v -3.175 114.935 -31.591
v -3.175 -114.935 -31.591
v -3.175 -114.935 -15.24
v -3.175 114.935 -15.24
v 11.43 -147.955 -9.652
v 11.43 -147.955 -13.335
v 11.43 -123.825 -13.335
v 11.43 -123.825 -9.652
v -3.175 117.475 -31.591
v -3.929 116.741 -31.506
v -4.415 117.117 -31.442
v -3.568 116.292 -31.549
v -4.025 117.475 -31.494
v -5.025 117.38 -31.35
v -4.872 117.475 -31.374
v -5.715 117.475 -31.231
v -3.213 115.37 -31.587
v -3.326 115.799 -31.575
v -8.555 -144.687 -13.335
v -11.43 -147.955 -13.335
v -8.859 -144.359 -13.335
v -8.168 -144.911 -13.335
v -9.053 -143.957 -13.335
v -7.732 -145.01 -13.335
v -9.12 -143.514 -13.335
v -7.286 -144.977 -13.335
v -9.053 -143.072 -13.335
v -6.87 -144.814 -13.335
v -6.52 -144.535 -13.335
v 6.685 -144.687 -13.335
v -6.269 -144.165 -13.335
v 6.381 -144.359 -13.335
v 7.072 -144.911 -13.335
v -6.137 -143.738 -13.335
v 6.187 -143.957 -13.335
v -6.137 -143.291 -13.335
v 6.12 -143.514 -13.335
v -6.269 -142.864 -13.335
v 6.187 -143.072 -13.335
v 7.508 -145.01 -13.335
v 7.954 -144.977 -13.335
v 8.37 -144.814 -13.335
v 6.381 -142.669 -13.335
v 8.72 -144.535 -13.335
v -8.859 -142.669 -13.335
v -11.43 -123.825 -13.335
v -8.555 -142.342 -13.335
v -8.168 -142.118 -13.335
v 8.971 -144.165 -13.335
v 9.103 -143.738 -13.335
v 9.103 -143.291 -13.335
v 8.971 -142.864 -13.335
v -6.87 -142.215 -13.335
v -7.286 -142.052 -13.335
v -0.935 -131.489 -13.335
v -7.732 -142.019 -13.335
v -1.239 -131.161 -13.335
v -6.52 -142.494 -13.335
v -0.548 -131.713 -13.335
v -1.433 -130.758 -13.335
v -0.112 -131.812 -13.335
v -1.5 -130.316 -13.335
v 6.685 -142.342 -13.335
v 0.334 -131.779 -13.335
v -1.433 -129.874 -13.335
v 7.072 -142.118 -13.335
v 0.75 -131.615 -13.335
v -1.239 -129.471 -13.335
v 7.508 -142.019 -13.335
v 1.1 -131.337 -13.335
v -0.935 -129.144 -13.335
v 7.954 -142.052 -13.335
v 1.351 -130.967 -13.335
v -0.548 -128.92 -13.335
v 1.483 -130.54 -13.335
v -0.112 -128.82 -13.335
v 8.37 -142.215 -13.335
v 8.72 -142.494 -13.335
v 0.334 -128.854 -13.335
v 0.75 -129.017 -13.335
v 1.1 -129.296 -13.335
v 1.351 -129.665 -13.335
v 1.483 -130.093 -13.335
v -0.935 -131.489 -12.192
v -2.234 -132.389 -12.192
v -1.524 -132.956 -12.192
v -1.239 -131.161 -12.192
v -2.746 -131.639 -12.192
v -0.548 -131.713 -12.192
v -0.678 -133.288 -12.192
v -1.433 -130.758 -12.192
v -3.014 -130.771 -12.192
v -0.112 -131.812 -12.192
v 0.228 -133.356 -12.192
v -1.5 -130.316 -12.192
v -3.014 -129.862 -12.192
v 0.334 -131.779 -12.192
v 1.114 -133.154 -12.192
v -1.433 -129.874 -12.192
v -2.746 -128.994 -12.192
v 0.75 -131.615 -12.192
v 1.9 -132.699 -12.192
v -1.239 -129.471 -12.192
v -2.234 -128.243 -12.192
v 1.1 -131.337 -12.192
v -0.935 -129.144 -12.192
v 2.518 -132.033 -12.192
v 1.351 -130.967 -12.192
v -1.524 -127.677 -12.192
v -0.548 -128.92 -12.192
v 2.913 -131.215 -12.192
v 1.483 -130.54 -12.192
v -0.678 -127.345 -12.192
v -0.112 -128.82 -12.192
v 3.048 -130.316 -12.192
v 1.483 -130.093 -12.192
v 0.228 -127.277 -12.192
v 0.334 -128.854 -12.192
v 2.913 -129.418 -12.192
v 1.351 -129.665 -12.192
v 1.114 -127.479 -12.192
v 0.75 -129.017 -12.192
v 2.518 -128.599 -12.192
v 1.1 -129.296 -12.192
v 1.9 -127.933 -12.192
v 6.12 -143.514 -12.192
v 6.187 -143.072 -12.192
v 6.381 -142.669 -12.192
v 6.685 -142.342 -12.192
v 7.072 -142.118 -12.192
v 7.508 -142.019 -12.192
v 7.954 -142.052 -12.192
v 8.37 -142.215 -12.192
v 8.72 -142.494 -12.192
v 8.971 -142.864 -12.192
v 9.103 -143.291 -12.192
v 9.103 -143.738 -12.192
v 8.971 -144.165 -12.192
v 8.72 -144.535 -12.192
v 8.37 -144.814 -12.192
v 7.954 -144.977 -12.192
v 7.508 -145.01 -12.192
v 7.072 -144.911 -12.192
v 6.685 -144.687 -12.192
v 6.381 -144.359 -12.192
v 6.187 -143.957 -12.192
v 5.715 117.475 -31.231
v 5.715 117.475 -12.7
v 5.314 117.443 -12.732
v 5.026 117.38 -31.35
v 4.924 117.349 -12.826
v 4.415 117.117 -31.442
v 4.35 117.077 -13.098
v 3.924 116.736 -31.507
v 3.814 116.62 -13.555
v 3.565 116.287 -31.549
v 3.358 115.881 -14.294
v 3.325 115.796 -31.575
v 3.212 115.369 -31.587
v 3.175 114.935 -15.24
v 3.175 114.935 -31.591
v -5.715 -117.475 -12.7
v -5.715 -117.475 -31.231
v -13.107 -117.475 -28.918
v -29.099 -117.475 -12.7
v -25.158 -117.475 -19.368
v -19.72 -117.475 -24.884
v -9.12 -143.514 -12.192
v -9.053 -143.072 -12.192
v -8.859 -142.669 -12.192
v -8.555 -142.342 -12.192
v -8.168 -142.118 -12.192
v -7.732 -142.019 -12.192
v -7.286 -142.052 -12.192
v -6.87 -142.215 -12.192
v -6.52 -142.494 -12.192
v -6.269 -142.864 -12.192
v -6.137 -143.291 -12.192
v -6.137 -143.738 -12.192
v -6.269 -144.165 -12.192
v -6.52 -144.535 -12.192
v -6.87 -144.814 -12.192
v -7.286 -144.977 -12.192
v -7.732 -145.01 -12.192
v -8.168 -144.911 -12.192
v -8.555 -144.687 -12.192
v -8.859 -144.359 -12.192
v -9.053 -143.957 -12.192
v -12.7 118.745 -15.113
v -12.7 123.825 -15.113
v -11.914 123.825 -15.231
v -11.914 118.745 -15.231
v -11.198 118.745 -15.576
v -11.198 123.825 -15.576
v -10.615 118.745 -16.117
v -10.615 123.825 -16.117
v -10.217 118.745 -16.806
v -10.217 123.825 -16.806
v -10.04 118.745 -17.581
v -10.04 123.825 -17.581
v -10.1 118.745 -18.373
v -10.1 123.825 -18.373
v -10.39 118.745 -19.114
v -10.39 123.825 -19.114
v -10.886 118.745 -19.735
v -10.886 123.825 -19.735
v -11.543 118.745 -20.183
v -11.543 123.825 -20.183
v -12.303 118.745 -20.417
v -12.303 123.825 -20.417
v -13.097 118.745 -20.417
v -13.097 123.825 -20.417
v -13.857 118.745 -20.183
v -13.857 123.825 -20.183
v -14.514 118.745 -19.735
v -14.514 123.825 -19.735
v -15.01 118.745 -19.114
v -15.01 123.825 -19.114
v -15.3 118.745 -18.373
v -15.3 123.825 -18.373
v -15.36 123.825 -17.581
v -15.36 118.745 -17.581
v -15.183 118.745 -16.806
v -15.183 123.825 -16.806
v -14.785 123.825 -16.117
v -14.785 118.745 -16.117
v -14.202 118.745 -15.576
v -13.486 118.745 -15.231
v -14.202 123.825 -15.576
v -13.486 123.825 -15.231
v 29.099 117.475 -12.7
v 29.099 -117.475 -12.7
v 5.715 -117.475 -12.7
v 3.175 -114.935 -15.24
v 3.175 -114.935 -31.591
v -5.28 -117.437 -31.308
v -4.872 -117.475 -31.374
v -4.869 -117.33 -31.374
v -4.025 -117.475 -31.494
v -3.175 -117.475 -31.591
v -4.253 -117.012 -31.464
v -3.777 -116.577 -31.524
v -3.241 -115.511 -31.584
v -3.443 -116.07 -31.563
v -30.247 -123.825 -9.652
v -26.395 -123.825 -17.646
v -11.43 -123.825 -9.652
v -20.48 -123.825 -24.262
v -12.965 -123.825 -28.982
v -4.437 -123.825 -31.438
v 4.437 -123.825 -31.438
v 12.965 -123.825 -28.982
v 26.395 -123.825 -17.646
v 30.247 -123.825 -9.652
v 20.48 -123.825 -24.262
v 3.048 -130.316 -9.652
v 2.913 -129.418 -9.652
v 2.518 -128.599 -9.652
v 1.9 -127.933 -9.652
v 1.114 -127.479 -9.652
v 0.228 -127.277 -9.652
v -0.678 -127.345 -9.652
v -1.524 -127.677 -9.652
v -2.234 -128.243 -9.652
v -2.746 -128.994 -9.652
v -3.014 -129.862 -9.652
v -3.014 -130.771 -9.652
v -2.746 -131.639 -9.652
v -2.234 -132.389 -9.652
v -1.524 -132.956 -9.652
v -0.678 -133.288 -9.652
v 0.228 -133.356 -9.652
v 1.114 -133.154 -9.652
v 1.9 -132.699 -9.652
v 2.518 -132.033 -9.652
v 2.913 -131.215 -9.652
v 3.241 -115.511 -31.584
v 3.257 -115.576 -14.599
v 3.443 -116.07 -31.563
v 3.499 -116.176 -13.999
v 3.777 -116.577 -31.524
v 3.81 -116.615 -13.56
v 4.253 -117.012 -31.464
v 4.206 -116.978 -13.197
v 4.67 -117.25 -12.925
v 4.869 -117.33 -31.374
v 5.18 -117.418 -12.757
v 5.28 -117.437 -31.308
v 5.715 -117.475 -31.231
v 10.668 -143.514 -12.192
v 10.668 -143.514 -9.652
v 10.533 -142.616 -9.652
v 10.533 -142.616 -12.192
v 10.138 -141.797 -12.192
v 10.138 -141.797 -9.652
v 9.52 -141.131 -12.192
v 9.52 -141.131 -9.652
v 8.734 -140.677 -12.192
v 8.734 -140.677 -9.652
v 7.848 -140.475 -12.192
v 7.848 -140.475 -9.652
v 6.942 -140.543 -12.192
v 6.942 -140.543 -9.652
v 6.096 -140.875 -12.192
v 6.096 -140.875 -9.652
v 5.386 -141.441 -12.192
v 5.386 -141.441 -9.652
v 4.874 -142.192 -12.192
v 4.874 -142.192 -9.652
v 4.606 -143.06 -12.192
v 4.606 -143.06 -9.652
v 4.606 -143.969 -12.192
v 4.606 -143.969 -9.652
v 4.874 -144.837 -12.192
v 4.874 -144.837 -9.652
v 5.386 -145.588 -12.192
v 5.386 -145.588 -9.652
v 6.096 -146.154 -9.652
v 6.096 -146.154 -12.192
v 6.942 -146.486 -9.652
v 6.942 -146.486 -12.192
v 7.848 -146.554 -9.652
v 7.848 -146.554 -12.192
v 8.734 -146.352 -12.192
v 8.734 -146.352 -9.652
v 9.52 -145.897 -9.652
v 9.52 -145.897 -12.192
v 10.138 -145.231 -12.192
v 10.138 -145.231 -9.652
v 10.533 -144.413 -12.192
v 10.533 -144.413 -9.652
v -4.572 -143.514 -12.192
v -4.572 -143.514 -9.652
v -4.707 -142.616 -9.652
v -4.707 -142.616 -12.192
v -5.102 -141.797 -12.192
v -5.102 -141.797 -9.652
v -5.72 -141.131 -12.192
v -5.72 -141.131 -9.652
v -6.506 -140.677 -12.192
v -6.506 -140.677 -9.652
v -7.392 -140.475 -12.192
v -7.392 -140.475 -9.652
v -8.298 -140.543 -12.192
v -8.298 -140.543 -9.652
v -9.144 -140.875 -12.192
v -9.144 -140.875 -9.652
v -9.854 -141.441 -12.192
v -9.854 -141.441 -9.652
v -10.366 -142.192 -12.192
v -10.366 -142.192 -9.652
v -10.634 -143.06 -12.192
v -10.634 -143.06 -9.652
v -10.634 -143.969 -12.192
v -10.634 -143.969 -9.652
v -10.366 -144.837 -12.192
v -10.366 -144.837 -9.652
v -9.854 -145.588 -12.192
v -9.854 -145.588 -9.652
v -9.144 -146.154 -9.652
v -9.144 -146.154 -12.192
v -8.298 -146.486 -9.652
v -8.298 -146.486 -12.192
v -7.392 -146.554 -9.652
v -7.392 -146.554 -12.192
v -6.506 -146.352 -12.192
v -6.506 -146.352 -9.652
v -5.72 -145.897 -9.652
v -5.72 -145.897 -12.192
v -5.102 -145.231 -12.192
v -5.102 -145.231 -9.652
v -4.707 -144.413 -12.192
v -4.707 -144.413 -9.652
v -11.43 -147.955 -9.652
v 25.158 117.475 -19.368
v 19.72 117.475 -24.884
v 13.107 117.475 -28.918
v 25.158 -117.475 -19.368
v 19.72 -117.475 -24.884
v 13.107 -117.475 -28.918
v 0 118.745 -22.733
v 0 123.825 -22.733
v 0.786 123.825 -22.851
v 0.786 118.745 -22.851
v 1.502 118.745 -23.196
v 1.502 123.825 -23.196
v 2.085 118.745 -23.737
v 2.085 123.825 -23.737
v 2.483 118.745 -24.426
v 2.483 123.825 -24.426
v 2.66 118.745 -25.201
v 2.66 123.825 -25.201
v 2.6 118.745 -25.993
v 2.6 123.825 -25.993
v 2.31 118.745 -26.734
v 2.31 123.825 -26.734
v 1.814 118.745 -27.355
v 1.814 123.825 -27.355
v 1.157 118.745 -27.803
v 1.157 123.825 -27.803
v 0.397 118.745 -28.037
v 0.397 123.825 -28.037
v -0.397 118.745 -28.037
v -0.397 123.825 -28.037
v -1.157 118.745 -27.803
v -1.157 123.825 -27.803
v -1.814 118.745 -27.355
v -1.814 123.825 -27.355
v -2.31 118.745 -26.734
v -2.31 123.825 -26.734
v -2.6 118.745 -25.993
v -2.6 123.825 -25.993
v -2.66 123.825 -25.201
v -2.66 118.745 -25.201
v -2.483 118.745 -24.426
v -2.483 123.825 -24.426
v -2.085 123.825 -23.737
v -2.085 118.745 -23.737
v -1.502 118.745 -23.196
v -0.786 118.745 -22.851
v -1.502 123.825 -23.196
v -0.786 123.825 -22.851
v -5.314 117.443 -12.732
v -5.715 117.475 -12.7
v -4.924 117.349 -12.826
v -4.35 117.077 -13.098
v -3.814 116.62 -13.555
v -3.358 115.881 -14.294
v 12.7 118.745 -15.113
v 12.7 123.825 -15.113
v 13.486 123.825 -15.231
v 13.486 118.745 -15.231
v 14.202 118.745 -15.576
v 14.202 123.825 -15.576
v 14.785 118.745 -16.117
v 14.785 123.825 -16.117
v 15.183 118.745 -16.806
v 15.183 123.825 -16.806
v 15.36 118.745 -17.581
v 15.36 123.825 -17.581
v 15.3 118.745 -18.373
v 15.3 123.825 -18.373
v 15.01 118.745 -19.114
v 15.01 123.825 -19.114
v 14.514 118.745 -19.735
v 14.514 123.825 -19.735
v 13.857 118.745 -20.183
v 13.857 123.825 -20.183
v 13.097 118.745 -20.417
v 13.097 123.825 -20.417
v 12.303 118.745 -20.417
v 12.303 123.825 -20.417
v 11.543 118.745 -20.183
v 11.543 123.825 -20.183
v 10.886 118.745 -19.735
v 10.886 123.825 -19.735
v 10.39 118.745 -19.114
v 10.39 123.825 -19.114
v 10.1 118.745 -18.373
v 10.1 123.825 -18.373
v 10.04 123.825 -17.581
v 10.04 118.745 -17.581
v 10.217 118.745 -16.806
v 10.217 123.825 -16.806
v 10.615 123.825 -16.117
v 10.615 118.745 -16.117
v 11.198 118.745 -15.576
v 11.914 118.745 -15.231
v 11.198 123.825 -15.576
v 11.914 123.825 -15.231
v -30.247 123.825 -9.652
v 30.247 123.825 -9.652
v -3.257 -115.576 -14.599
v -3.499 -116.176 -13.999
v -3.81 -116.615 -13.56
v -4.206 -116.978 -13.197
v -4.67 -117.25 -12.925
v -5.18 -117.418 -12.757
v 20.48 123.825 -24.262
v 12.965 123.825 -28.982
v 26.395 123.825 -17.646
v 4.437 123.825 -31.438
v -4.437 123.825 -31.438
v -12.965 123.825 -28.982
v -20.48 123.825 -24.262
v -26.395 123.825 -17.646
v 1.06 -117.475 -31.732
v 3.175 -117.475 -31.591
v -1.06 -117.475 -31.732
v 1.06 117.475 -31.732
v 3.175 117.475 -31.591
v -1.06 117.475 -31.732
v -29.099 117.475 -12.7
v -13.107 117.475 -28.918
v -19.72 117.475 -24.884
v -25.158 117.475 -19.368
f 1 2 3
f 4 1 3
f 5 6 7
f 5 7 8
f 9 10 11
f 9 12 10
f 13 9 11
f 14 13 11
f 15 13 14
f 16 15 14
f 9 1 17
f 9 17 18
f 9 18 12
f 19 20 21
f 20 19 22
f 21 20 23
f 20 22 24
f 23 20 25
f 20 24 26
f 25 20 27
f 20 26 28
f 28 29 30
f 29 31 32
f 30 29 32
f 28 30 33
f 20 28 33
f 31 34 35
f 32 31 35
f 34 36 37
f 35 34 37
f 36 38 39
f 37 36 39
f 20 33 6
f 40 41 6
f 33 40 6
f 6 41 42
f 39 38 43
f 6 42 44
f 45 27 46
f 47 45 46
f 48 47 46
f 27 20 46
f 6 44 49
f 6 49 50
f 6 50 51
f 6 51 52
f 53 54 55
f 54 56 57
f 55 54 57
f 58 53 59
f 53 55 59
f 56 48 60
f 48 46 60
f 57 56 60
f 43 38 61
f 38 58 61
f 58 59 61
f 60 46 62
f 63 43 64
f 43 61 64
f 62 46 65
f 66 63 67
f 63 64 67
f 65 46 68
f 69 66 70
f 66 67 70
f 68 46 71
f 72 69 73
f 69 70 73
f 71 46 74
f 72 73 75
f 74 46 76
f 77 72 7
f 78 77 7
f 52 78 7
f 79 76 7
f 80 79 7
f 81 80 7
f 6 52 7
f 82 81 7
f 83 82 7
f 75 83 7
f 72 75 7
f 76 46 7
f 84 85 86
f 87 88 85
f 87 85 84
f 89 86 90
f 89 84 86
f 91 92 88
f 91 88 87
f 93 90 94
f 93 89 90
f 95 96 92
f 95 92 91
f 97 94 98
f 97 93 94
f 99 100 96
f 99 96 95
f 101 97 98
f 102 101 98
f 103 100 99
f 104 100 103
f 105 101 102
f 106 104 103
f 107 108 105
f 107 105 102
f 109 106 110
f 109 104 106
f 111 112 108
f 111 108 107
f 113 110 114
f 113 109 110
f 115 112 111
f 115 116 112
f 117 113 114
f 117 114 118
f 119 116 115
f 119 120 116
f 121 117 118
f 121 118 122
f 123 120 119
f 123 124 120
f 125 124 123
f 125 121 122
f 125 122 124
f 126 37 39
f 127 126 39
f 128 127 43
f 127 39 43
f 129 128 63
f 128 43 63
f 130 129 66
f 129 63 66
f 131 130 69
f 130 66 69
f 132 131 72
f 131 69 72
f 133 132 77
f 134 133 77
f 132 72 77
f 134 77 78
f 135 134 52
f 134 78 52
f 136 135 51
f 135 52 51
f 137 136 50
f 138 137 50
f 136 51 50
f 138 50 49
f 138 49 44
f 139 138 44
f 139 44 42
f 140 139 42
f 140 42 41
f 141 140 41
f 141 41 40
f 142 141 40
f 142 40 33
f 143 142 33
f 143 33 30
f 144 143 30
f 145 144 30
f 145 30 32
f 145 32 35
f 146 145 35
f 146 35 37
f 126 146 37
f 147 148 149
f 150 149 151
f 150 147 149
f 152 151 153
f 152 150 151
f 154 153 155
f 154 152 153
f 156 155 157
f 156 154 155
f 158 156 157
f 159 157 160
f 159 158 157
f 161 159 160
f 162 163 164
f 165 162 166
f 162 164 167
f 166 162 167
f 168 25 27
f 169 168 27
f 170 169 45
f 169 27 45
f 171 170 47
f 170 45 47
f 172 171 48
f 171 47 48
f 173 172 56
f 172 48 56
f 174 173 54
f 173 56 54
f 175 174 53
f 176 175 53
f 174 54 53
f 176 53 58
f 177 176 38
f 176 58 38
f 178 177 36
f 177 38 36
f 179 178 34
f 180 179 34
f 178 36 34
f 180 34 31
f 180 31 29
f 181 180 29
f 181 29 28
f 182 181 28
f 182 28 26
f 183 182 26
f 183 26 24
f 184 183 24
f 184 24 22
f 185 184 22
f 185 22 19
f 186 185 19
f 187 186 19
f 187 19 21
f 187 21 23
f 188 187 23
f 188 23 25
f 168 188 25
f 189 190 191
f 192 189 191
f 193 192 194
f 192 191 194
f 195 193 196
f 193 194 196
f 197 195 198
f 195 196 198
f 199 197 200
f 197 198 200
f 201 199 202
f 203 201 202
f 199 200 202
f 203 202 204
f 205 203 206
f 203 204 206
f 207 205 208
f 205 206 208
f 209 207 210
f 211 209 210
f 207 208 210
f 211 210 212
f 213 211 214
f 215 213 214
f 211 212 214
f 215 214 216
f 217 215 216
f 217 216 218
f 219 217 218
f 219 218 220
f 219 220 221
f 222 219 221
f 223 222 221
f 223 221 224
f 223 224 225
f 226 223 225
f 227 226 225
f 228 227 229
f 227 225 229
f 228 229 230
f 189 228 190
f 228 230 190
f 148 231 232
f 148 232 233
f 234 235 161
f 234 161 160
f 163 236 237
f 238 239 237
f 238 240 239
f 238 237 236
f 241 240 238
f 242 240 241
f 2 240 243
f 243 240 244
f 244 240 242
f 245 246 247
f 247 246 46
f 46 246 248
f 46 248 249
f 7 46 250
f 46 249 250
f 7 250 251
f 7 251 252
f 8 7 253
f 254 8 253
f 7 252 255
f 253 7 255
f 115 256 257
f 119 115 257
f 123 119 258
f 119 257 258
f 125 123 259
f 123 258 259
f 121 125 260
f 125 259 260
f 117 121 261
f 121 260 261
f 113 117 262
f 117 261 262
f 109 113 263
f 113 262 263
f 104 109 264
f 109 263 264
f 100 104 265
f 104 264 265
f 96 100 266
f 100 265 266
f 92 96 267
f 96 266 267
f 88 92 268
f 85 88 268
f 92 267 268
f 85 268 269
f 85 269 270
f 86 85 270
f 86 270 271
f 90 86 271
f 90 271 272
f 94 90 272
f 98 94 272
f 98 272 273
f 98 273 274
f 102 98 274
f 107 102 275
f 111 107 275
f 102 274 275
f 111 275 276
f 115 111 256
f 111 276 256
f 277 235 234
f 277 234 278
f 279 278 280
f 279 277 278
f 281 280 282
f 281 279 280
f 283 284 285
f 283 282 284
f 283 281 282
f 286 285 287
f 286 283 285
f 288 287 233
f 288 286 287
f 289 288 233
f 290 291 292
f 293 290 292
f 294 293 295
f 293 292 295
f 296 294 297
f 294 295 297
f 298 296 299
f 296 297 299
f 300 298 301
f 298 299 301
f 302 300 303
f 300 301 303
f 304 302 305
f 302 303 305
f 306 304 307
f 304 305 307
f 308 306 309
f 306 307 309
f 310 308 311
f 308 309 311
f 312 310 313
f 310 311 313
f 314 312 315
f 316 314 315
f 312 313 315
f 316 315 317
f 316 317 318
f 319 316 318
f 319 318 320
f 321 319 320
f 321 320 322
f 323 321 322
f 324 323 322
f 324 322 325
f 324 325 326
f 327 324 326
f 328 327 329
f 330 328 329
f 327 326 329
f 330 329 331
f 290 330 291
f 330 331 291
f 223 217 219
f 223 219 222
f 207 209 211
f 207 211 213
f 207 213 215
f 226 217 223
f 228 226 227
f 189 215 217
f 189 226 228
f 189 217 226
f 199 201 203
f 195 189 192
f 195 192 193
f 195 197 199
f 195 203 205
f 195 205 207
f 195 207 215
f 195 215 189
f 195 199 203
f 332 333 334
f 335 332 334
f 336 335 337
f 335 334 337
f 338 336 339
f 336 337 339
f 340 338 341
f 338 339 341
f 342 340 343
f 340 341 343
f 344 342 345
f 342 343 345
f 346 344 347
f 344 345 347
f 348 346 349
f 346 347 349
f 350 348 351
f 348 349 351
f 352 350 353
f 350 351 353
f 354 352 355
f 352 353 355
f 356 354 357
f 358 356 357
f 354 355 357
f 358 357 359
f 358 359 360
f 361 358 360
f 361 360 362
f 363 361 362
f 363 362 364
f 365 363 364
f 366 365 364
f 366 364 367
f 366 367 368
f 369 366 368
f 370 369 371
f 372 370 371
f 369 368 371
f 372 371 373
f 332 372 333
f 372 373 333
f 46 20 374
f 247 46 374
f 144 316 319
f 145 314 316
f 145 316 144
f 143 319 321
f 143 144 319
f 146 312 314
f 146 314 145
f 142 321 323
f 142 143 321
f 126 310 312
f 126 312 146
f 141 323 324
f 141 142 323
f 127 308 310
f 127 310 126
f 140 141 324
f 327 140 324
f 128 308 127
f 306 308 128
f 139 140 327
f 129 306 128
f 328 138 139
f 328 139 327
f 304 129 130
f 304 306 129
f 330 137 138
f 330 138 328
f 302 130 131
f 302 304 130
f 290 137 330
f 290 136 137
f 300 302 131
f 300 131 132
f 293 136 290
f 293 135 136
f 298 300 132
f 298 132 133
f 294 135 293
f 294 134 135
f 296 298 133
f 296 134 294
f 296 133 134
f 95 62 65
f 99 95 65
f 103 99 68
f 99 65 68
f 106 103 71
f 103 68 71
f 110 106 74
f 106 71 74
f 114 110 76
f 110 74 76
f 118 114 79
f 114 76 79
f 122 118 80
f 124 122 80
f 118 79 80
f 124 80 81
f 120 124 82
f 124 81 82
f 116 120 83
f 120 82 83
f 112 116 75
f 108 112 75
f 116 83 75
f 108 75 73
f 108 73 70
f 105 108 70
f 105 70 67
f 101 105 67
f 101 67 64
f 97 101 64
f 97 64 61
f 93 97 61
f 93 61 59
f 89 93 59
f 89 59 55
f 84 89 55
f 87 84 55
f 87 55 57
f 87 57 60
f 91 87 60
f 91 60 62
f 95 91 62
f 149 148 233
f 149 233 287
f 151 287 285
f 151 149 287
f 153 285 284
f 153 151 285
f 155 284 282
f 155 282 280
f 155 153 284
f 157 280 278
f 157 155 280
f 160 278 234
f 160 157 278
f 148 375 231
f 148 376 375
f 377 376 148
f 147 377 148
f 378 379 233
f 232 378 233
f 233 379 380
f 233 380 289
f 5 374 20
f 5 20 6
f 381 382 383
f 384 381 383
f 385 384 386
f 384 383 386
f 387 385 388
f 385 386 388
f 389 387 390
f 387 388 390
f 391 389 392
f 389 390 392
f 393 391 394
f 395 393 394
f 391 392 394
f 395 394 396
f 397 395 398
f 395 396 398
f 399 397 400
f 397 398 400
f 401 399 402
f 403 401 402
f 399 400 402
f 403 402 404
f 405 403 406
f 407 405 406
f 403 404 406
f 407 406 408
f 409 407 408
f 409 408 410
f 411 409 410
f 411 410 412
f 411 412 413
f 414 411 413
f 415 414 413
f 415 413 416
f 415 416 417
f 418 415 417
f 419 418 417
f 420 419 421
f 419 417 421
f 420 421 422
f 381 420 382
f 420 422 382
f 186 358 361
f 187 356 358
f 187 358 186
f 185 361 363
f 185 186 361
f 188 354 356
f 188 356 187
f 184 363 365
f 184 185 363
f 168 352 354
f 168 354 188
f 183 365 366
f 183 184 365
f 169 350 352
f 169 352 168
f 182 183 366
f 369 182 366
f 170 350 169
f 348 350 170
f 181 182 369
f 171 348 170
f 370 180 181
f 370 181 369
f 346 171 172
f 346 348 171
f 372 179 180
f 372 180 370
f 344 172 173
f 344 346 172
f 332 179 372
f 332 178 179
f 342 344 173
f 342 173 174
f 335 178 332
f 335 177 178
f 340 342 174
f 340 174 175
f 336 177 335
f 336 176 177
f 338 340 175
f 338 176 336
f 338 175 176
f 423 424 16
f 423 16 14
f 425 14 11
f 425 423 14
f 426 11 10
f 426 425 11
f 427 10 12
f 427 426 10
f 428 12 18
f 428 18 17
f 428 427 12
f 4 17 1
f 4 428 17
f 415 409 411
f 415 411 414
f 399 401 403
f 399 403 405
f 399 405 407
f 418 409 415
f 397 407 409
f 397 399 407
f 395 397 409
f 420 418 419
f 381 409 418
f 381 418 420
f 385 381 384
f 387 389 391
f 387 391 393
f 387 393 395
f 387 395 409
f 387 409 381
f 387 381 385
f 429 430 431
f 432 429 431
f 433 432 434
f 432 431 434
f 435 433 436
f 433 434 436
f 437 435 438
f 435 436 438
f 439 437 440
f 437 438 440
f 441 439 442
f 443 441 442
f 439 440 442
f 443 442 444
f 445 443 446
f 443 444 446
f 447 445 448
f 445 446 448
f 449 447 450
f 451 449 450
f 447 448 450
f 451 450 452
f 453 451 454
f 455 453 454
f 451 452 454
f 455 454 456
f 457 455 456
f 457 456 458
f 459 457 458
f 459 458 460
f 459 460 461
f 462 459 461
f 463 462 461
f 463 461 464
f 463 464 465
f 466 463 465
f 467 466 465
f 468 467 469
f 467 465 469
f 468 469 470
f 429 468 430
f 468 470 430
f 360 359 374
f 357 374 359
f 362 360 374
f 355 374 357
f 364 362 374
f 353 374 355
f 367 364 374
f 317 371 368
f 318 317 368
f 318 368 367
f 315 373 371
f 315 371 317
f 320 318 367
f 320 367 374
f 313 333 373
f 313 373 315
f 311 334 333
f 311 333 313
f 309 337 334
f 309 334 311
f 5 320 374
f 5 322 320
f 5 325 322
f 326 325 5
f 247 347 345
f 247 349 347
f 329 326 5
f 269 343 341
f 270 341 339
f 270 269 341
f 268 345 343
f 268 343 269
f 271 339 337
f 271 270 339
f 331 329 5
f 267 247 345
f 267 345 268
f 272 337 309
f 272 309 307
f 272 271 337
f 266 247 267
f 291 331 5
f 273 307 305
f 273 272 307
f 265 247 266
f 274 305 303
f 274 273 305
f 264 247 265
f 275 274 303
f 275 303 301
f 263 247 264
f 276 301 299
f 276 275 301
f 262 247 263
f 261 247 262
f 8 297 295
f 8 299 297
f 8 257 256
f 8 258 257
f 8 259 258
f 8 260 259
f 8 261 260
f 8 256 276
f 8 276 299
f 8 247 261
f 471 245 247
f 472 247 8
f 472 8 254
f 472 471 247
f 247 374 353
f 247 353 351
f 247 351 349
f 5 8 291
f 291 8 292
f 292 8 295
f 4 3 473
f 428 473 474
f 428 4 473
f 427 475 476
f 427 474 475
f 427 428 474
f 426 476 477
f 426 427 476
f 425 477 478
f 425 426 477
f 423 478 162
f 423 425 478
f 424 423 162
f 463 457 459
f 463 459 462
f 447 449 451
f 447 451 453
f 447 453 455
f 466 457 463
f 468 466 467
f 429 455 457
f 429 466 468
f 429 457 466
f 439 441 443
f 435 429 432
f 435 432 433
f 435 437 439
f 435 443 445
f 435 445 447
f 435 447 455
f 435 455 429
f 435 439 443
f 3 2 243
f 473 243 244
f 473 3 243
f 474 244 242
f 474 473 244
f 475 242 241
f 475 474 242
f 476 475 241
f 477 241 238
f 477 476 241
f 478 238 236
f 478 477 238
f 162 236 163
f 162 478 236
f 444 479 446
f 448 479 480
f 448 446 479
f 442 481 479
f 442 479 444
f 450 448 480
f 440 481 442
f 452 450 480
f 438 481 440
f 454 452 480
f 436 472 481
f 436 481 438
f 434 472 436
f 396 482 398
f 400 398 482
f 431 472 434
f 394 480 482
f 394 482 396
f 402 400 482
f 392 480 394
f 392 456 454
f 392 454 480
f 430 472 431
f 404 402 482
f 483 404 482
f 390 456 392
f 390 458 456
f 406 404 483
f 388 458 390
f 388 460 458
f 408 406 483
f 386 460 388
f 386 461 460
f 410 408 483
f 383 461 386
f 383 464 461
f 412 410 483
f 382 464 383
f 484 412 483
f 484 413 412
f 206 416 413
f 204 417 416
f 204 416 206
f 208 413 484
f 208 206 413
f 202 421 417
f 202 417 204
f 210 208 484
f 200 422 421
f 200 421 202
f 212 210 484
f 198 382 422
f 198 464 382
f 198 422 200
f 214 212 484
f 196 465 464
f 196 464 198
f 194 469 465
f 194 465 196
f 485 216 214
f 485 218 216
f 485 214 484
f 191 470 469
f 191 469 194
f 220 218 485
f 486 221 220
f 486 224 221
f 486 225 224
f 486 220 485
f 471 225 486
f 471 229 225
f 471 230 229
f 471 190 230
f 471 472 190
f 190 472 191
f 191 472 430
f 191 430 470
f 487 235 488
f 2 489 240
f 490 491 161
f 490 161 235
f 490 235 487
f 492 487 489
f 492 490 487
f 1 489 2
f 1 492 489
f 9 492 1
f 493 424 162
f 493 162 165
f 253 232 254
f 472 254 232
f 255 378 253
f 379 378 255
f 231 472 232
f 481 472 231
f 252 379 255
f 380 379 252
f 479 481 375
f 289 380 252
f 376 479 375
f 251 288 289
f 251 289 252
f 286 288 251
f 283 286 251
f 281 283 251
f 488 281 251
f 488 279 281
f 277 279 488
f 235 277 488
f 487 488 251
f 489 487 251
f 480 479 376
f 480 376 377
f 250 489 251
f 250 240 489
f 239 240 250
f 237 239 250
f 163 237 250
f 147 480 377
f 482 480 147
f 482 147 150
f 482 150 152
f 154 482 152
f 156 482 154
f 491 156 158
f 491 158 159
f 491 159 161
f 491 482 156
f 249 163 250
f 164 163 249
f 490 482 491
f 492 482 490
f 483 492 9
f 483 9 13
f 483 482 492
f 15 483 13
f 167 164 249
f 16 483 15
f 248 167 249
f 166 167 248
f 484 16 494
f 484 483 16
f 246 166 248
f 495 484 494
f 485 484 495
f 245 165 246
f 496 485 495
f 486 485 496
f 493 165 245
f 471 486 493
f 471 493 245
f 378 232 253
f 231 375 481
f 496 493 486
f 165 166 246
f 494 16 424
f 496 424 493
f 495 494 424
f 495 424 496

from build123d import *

# Parameters (mm, degrees)
BOSS_EXTRUDE1_DEPTH   = 123.825
SKETCH2_W             = 22.86
SKETCH2_H             = 3.683
BOSS_EXTRUDE2_DEPTH   = 24.13
SKETCH8_R             = 2.667
CUT_EXTRUDE3_DEPTH    = 5.08
SKETCH3_R             = 3.048
CUT_EXTRUDE1_DEPTH    = 2.54
F_3_0MM_DOWEL_HOLE1_D = 3
SKETCH6_W             = 60.494674014
SKETCH6_H             = 234.95
CUT_EXTRUDE2_DEPTH    = 19.05
SKETCH7_W             = 6.35
SKETCH7_H             = 18.890851128
BOSS_EXTRUDE3_DEPTH   = 234.95
FILLET1_R             = 2.54


with BuildPart() as part:
    # Sketch1 → Boss-Extrude1 (new, symmetric)
    with BuildSketch(Plane(origin=(0, 0, 0), x_dir=(1, 0, 0), z_dir=(0, 1, 0))):
        with BuildLine():
            ThreePointArc((30.247337007, 9.652), (0, 31.75), (-30.247337007, 9.652))
            Line((-30.247337007, 9.652), (30.247337007, 9.652))
        make_face()
    extrude(amount=BOSS_EXTRUDE1_DEPTH, both=True)

    # Sketch2 → Boss-Extrude2 (add)
    with BuildSketch(Plane.XZ.offset(123.825)):
        with Locations((0, -11.4935)):
            Rectangle(SKETCH2_W, SKETCH2_H)
    extrude(amount=BOSS_EXTRUDE2_DEPTH)

    # Sketch8 → Cut-Extrude3 (cut)
    with BuildSketch(Plane(origin=(0, 123.825, 0), x_dir=(1, 0, 0), z_dir=(0, 1, 0))):
        with Locations(Location((0, 25.4, 0), (0, 0, 270))):
            Circle(SKETCH8_R)
        with Locations(Location((-12.7, 17.78, 0), (0, 0, 270))):
            Circle(SKETCH8_R)
        with Locations(Location((12.7, 17.78, 0), (0, 0, 270))):
            Circle(SKETCH8_R)
    extrude(amount=-CUT_EXTRUDE3_DEPTH, mode=Mode.SUBTRACT)

    # Sketch3 → Cut-Extrude1 (cut)
    with BuildSketch(Plane.XY.offset(-9.652)):
        with Locations((0, -130.316247378)):
            Circle(SKETCH3_R)
        with Locations((-7.62, -143.514474532)):
            Circle(SKETCH3_R)
        with Locations((7.62, -143.514474532)):
            Circle(SKETCH3_R)
    extrude(amount=-CUT_EXTRUDE1_DEPTH, mode=Mode.SUBTRACT)

    # Ø3.0mm Dowel Hole1 (through all)
    with Locations(Plane.XY.offset(-9.652)):
        with Locations((0, -130.316247378), (7.62, -143.514474532), (-7.62, -143.514474532)):
            Hole(F_3_0MM_DOWEL_HOLE1_D / 2)

    # Sketch6 → Cut-Extrude2 (cut)
    with BuildSketch(Plane(origin=(0, 0, -31.75), x_dir=(-1, 0, 0), z_dir=(0, 0, -1))):
        Rectangle(SKETCH6_W, SKETCH6_H)
    extrude(amount=-CUT_EXTRUDE2_DEPTH, mode=Mode.SUBTRACT)

    # Sketch7 → Boss-Extrude3 (add)
    with BuildSketch(Plane.XZ.offset(-117.475)):
        with BuildLine():
            ThreePointArc((-3.175, -31.590851128), (0, -31.75), (3.175, -31.590851128))
            Line((3.175, -31.590851128), (-3.175, -31.590851128))
        make_face()
        with Locations((0, -22.145425564)):
            Rectangle(SKETCH7_W, SKETCH7_H)
    extrude(amount=BOSS_EXTRUDE3_DEPTH)

    # Fillet1
    # the kernel refuses this fillet: 2.54 mm, written as the material it adds along each edge
    with BuildSketch(Plane(origin=(3.175, 117.475, -37.940851128), x_dir=(1, 0, 0), z_dir=(0, 0, 1))) as fillet1_piece_1_section:
        with BuildLine():
            CenterArc((FILLET1_R, -FILLET1_R), FILLET1_R, 90, 90)
            Line((0, -FILLET1_R), (0, 0))
            Line((0, 0), (FILLET1_R, 0))
        make_face()
    fillet1_piece_1 = extrude(amount=25.240851128, mode=Mode.PRIVATE)
    fillet1_piece_1 = fillet1_piece_1 & Plane(origin=(0, 116.898787332, 0), x_dir=(0.9526720317087093, 0, -0.3040000000000001), z_dir=(0, 1, 0)) * Cylinder(31.75, 61, mode=Mode.PRIVATE)
    add(fillet1_piece_1)
    with BuildSketch(Plane(origin=(3.175, -117.475, -37.940851128), x_dir=(1, 0, 0), z_dir=(0, 0, 1))) as fillet1_piece_2_section:
        with BuildLine():
            CenterArc((FILLET1_R, FILLET1_R), FILLET1_R, 180, 90)
            Line((0, FILLET1_R), (0, 0))
            Line((0, 0), (FILLET1_R, 0))
        make_face()
    fillet1_piece_2 = extrude(amount=25.240851128, mode=Mode.PRIVATE)
    fillet1_piece_2 = fillet1_piece_2 & Plane(origin=(0, -116.898787332, 0), x_dir=(0.9526720317087093, 0, -0.3040000000000001), z_dir=(0, 1, 0)) * Cylinder(31.75, 61, mode=Mode.PRIVATE)
    add(fillet1_piece_2)
    with BuildSketch(Plane(origin=(-3.175, 117.475, -12.7), x_dir=(-1, 0, 0), z_dir=(0, 0, -1))) as fillet1_piece_3_section:
        with BuildLine():
            CenterArc((FILLET1_R, -FILLET1_R), FILLET1_R, 90, 90)
            Line((0, -FILLET1_R), (0, 0))
            Line((0, 0), (FILLET1_R, 0))
        make_face()
    fillet1_piece_3 = extrude(amount=25.240851128, mode=Mode.PRIVATE)
    fillet1_piece_3 = fillet1_piece_3 & Plane(origin=(0, 116.898782869, 0), x_dir=(0.9526720317087093, 0, -0.3040000000000001), z_dir=(0, 1, 0)) * Cylinder(31.75, 61, mode=Mode.PRIVATE)
    add(fillet1_piece_3)
    with BuildSketch(Plane(origin=(-3.175, -117.475, -12.7), x_dir=(-1, 0, 0), z_dir=(0, 0, -1))) as fillet1_piece_4_section:
        with BuildLine():
            CenterArc((FILLET1_R, FILLET1_R), FILLET1_R, 180, 90)
            Line((0, FILLET1_R), (0, 0))
            Line((0, 0), (FILLET1_R, 0))
        make_face()
    fillet1_piece_4 = extrude(amount=25.240851128, mode=Mode.PRIVATE)
    fillet1_piece_4 = fillet1_piece_4 & Plane(origin=(0, -116.898782869, 0), x_dir=(0.9526720317087093, 0, -0.3040000000000001), z_dir=(0, 1, 0)) * Cylinder(31.75, 61, mode=Mode.PRIVATE)
    add(fillet1_piece_4)
    with BuildSketch(Plane(origin=(-3.175, 123.825, -12.7), x_dir=(-1, 0, 0), z_dir=(0, -1, 0))) as fillet1_piece_5:
        with BuildLine():
            CenterArc((FILLET1_R, FILLET1_R), FILLET1_R, 180, 90)
            Line((0, FILLET1_R), (0, 0))
            Line((0, 0), (FILLET1_R, 0))
        make_face()
    extrude(amount=247.65)
    with BuildSketch(Plane(origin=(3.175, 123.825, -12.7), x_dir=(1, 0, 0), z_dir=(0, -1, 0))) as fillet1_piece_6:
        with BuildLine():
            CenterArc((FILLET1_R, -FILLET1_R), FILLET1_R, 90, 90)
            Line((0, -FILLET1_R), (0, 0))
            Line((0, 0), (FILLET1_R, 0))
        make_face()
    extrude(amount=247.65)


solid = part.part
